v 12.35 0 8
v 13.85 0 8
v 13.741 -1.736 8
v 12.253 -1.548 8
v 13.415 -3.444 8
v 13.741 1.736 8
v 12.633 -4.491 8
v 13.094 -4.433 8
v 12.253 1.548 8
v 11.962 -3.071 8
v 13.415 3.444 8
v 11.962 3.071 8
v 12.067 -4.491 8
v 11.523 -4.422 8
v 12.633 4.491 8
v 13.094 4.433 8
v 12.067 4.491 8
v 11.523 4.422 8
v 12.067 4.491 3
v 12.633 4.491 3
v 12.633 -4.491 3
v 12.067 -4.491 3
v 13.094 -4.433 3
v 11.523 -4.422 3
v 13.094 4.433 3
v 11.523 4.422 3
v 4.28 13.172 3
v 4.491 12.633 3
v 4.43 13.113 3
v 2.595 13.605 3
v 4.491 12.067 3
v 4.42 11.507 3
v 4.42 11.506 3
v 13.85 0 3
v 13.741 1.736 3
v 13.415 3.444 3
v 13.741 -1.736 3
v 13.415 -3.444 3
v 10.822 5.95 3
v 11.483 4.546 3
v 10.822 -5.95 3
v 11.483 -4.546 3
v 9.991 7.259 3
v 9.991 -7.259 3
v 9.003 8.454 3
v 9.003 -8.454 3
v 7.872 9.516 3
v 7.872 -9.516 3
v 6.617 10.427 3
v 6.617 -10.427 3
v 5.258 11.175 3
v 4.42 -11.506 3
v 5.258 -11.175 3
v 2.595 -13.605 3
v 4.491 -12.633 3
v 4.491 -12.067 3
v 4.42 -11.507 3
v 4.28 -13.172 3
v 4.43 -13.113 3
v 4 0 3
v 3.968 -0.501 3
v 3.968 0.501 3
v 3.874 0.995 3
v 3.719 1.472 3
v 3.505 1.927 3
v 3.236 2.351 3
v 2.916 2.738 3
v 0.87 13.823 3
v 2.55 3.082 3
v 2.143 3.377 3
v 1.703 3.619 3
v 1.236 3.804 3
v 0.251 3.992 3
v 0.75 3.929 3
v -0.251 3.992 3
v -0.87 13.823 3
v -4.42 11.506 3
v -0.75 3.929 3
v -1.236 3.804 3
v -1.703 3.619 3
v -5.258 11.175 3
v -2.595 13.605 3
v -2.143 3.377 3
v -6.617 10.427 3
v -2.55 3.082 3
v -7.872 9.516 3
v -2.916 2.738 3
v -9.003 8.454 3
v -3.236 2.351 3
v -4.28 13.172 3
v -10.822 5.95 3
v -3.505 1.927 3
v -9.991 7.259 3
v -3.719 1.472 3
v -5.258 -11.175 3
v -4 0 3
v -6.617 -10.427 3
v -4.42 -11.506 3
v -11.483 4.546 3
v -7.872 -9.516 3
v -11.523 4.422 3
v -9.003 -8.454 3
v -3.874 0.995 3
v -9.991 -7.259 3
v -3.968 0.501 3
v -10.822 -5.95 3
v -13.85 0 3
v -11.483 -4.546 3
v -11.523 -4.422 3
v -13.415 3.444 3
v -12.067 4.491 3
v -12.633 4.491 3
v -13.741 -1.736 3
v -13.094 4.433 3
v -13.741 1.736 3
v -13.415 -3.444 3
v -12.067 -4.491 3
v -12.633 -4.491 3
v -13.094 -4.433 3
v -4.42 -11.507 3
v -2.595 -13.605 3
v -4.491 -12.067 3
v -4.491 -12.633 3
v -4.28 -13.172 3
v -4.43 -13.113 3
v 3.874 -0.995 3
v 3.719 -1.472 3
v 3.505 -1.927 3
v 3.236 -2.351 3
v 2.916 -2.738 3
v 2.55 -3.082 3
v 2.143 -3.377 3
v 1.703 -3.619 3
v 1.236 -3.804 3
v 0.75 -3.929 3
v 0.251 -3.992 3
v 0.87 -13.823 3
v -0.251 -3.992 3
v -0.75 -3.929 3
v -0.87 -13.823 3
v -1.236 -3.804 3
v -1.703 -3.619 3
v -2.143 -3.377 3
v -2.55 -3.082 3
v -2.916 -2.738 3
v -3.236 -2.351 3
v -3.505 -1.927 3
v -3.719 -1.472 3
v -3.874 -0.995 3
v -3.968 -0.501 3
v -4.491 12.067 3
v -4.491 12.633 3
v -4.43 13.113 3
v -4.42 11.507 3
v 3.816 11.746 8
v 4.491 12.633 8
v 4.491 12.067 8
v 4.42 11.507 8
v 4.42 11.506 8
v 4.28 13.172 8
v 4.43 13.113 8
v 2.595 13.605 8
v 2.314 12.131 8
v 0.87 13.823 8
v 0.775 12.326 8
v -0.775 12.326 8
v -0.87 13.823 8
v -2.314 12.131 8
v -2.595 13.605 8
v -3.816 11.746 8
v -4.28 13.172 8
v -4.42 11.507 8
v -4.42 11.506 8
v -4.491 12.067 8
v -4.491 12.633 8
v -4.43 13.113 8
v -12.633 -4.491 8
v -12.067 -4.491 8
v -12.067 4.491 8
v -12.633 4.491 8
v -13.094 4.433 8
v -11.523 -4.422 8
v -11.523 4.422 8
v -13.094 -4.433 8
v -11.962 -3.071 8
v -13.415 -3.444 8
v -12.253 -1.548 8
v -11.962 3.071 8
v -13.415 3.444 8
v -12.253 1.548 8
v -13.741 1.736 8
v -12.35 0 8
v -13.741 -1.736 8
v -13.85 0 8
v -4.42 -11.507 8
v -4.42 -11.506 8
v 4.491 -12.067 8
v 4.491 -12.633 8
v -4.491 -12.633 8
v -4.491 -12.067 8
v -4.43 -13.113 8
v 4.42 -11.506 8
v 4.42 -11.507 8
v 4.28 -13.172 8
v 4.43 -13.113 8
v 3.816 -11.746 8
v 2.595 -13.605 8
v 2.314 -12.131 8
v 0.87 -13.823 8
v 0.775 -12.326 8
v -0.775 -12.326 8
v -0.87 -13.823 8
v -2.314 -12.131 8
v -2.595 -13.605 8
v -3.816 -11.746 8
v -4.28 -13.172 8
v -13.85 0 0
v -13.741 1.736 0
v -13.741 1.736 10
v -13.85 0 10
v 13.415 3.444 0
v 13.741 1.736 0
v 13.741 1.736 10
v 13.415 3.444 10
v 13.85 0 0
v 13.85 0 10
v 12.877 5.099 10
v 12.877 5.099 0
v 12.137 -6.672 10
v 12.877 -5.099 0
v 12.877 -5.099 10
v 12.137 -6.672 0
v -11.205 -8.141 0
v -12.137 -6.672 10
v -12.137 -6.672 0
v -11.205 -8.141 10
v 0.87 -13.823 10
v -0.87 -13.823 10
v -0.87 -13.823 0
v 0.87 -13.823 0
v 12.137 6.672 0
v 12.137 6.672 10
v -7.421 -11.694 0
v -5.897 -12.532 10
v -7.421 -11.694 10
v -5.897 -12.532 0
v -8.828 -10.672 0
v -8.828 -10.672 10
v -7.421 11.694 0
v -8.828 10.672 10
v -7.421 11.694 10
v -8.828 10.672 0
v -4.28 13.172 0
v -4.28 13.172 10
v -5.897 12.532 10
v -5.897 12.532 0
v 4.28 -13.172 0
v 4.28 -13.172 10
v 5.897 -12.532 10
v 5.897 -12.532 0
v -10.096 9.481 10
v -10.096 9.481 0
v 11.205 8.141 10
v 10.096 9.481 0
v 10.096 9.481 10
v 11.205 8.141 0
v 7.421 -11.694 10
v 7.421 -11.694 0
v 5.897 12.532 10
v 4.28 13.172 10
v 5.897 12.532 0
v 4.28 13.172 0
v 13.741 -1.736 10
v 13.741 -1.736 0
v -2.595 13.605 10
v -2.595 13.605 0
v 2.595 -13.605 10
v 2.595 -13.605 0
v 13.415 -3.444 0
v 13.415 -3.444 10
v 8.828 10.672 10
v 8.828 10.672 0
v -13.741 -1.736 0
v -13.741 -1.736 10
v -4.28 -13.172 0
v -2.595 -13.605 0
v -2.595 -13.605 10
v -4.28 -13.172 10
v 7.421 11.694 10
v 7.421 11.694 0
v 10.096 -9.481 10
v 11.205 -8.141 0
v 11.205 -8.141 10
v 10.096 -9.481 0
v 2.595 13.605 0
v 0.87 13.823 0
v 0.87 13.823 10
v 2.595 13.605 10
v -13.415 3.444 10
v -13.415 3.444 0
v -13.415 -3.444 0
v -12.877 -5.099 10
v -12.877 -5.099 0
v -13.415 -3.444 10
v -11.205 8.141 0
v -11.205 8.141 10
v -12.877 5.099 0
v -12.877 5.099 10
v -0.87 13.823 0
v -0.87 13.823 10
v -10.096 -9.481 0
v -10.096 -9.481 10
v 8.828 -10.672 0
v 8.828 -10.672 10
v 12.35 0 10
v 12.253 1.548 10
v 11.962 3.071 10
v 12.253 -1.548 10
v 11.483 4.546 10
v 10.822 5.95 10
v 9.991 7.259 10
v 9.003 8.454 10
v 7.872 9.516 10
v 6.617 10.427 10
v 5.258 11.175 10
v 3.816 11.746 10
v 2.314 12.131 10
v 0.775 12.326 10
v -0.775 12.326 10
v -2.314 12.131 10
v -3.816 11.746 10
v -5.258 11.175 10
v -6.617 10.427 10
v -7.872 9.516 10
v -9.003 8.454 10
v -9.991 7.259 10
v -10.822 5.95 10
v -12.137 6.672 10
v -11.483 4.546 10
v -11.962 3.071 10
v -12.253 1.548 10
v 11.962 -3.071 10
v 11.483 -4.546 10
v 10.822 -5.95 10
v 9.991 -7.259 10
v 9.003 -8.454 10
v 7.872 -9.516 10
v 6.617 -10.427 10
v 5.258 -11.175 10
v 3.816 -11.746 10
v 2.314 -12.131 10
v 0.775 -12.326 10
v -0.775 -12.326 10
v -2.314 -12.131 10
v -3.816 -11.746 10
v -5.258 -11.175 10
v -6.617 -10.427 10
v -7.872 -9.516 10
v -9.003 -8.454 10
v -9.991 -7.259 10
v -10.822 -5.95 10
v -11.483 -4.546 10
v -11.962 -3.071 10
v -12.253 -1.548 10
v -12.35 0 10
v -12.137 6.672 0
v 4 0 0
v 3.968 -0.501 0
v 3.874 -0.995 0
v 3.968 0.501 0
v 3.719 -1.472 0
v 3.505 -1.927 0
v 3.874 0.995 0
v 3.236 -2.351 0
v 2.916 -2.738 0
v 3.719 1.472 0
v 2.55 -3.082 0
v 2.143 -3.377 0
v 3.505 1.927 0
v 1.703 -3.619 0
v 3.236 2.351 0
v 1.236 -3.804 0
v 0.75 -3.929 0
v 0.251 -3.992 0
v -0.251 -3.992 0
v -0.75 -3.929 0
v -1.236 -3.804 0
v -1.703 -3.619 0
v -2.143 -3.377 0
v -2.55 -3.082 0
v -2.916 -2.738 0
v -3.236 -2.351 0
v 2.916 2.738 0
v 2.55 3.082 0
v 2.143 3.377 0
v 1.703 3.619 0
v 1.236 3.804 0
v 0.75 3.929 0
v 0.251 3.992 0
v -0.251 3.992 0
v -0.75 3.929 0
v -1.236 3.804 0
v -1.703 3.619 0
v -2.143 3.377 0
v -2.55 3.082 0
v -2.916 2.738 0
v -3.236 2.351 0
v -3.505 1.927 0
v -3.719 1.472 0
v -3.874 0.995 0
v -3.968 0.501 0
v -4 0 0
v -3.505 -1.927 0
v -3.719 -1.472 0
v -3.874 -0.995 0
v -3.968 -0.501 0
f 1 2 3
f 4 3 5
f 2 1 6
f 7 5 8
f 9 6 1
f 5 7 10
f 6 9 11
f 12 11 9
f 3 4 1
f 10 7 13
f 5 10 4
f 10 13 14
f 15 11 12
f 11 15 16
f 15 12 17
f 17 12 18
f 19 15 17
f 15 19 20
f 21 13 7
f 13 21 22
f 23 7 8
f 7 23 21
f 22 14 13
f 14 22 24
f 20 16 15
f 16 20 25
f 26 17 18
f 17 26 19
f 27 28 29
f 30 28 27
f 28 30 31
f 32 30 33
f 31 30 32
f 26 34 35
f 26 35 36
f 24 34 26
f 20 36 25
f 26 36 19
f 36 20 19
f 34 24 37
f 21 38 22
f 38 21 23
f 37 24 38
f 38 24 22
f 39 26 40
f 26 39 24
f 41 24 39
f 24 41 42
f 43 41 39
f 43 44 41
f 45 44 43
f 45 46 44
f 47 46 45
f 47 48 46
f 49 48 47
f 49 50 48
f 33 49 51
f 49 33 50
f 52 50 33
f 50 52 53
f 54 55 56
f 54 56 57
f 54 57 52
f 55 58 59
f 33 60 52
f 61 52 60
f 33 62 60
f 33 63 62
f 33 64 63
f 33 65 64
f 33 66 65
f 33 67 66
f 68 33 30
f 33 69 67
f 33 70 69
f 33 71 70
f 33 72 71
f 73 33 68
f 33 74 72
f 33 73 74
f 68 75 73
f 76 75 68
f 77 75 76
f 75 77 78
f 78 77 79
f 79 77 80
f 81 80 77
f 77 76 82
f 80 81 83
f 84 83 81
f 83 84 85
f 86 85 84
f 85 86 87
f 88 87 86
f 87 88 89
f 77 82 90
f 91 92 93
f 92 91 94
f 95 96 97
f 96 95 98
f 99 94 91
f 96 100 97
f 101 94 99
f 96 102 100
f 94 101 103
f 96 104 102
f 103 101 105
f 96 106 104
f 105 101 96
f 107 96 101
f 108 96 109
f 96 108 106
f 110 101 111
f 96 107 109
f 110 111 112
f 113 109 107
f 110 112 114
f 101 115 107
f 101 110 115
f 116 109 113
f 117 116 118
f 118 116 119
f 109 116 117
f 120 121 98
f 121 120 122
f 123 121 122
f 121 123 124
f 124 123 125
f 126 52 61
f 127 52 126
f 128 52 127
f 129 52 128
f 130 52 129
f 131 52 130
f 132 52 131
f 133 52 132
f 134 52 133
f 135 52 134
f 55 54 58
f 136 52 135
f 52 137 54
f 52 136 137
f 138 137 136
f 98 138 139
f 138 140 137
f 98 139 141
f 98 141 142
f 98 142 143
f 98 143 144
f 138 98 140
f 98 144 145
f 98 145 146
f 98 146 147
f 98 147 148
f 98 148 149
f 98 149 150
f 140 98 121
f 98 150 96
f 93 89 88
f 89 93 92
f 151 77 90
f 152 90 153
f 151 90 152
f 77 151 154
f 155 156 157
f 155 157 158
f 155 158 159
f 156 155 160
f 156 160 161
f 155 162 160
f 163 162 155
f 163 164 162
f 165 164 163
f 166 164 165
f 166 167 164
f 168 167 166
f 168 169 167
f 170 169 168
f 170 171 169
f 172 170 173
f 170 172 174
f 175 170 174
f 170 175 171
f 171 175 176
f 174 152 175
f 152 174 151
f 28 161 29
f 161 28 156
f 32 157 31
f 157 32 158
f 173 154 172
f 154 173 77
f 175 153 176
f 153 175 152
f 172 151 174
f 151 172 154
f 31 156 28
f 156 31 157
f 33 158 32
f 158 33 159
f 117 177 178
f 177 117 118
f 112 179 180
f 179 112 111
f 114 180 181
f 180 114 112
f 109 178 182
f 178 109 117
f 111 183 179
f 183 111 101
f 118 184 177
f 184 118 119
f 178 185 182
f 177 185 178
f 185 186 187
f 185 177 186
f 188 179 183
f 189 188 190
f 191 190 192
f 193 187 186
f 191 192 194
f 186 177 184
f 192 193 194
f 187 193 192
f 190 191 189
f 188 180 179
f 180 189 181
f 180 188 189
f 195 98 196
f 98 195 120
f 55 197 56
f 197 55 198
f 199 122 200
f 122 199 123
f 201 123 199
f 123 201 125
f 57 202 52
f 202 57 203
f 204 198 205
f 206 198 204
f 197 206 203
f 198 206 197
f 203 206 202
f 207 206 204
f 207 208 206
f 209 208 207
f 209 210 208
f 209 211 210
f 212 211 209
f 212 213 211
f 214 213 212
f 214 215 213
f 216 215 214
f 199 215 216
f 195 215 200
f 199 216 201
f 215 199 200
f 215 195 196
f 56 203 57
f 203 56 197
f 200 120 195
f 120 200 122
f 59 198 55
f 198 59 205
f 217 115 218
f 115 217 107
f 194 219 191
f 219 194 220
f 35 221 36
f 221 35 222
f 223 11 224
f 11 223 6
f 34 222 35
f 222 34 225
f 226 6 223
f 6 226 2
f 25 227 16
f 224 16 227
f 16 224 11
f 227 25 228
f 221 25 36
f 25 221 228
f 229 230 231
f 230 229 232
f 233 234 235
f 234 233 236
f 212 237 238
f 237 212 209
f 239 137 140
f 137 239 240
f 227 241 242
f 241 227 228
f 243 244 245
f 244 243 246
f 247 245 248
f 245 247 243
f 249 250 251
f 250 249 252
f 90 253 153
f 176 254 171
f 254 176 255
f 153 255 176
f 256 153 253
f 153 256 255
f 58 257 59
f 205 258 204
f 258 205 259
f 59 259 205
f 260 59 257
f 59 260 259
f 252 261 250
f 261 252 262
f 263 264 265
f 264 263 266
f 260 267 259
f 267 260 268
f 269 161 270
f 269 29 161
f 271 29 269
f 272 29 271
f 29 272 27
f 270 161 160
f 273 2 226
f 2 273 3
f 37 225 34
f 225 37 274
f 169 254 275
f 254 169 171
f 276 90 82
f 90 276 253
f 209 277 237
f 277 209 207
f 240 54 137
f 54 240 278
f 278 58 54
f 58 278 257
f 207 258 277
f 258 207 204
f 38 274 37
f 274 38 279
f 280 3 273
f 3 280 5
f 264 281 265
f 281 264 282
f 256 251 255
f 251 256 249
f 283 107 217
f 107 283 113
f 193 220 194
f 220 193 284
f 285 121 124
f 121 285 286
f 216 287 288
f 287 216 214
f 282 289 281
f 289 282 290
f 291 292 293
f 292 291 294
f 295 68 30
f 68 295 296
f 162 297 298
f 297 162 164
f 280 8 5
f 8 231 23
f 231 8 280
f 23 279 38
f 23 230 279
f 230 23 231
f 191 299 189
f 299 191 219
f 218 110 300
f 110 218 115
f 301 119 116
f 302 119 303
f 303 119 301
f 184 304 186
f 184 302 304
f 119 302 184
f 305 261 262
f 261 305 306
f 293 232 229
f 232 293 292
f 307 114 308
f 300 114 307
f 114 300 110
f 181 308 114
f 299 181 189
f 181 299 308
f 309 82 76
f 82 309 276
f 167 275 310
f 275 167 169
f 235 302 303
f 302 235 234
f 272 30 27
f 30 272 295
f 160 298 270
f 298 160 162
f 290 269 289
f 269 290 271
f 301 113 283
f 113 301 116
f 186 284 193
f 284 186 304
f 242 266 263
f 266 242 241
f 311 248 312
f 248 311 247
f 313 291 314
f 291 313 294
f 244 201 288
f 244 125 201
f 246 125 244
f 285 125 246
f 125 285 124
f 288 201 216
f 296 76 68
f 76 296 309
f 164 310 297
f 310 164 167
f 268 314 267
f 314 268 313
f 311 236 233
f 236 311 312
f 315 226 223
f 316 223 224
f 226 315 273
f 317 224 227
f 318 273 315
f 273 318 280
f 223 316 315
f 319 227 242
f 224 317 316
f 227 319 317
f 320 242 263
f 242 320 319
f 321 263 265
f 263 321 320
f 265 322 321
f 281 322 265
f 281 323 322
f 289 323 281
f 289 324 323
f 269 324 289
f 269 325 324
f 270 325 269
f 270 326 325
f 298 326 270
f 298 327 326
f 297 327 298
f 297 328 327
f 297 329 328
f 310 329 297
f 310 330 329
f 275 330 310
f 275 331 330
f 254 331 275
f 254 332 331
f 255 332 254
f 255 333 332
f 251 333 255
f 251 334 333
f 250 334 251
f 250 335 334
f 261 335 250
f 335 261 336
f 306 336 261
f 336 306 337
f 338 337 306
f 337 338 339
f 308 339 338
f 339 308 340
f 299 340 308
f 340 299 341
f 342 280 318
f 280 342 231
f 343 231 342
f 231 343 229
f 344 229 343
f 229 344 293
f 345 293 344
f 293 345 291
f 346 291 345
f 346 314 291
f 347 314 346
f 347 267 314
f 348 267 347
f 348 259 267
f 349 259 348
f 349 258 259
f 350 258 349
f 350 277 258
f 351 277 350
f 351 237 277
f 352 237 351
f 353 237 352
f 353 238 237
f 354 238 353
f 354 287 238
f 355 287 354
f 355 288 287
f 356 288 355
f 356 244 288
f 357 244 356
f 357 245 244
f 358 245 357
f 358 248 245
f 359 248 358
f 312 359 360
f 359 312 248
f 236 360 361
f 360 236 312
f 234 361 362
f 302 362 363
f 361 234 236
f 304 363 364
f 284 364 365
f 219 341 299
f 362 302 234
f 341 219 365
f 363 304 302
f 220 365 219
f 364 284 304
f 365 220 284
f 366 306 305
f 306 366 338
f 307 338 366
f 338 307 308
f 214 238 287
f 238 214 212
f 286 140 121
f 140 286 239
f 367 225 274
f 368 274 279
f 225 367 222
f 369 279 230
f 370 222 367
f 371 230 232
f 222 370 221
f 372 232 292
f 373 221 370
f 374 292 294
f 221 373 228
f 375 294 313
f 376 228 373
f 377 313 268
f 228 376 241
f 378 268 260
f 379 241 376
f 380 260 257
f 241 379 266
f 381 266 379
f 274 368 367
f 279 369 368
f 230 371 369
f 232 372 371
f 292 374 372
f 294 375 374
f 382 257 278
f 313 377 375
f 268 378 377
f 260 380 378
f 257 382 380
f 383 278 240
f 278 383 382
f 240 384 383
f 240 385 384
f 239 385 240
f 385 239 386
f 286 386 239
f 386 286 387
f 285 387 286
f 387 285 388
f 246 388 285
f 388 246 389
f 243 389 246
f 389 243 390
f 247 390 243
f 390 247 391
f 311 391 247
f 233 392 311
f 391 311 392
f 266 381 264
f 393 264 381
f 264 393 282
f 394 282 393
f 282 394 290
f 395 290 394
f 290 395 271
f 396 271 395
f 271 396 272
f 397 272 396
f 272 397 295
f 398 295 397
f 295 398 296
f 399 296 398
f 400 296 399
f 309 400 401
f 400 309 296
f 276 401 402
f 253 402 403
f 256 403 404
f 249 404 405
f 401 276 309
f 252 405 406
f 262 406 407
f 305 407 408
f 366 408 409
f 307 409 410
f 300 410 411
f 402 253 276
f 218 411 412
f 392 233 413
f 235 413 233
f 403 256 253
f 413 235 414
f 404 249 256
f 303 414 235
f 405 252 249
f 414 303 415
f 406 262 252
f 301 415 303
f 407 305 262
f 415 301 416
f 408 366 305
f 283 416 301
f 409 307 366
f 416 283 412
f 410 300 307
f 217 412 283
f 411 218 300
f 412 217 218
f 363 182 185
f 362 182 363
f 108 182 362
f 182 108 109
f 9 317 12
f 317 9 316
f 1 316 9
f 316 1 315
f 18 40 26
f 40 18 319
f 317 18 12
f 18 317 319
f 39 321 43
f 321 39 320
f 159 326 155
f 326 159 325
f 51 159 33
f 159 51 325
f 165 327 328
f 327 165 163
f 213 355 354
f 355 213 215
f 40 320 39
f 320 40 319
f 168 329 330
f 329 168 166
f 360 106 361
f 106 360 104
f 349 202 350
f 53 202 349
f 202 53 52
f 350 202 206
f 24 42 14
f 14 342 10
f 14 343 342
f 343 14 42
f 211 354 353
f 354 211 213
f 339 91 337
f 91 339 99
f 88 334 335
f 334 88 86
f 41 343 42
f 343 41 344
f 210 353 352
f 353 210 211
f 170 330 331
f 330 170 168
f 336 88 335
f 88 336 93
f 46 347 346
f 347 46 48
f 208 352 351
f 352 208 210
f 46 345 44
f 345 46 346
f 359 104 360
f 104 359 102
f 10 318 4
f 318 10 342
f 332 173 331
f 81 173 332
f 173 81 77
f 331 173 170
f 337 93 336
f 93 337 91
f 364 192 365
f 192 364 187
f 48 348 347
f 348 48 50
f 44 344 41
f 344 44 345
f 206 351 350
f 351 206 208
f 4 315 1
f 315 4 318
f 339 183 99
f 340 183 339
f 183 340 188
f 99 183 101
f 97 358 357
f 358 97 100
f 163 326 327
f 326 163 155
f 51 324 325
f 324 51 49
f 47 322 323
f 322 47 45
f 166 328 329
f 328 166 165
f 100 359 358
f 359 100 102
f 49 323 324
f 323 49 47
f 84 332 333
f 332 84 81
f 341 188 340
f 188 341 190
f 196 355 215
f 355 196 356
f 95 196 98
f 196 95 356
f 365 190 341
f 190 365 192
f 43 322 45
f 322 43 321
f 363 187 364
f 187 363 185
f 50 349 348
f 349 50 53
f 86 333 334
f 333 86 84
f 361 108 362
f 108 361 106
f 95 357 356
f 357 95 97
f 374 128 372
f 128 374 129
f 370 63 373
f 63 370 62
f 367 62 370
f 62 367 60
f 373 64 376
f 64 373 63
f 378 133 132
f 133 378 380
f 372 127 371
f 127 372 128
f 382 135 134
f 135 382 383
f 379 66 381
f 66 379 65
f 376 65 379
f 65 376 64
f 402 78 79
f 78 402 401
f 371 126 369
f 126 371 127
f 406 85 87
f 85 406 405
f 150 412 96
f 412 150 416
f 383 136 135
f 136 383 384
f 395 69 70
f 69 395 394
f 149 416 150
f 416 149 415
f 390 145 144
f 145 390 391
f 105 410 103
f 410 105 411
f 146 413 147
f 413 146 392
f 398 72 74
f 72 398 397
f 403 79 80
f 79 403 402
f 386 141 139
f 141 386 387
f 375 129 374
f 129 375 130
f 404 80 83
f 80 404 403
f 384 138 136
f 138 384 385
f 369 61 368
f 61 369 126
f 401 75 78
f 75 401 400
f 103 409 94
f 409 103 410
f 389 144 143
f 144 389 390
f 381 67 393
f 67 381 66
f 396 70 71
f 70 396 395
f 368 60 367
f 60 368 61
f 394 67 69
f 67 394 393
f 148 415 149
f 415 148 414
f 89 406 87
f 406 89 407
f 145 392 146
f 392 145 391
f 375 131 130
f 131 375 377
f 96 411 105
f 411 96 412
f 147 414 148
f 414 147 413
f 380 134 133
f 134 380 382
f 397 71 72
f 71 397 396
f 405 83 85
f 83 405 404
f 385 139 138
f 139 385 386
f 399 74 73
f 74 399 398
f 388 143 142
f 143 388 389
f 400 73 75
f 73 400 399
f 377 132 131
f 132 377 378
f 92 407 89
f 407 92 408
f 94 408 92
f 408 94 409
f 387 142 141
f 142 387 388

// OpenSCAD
///////////////////////////////////////
// Container properties
    //Height (Default 10mm)
    height=10;
    //Inner Diameter(Change this for other bottle sizes).
    inner = 24.7;
    // Citadel Paint Bottle inner = 24.7;
    // Vallejo Paint Bottle inner = 32.7;
    //Outer Diameter
    outer = inner+3;
    //outer = inner+4;
    distortion = inner+2;
    outcut = inner/2;
    houtcut = height-5;
    //Smoothness
    $fn=50;
    
///////////////////////////////////////
// Number of bottles, type in desired #of for each Axis
    xaksis = 1;
    yaksis = 1;

module oppbevaring() {

// Main container
difference(){
cylinder (d = outer, h = height);

translate([0,0,3])    
cylinder (d = inner, h = height);

// Underside top cap hole (for stackability)
translate([0,0,0])        
//cylinder (d1 = 16, d2= 14, h = 4);
cylinder (d = 8, h = 4);
     
// Reduced print material
for(r=[0:4]) {
    rotate([0,0,r*360/4])
    translate([outcut,0,3])
    cylinder (d = 9, h = houtcut);
  }
   
}
}

///////////////////////////////////////
// Container generation
    XA = xaksis-1;
    YA = yaksis-1;

for (y = [0:YA]) {
    translate([0,y*distortion,0])
for(x = [0:XA]) {
translate([x*distortion,0,0])
oppbevaring();
}
}
